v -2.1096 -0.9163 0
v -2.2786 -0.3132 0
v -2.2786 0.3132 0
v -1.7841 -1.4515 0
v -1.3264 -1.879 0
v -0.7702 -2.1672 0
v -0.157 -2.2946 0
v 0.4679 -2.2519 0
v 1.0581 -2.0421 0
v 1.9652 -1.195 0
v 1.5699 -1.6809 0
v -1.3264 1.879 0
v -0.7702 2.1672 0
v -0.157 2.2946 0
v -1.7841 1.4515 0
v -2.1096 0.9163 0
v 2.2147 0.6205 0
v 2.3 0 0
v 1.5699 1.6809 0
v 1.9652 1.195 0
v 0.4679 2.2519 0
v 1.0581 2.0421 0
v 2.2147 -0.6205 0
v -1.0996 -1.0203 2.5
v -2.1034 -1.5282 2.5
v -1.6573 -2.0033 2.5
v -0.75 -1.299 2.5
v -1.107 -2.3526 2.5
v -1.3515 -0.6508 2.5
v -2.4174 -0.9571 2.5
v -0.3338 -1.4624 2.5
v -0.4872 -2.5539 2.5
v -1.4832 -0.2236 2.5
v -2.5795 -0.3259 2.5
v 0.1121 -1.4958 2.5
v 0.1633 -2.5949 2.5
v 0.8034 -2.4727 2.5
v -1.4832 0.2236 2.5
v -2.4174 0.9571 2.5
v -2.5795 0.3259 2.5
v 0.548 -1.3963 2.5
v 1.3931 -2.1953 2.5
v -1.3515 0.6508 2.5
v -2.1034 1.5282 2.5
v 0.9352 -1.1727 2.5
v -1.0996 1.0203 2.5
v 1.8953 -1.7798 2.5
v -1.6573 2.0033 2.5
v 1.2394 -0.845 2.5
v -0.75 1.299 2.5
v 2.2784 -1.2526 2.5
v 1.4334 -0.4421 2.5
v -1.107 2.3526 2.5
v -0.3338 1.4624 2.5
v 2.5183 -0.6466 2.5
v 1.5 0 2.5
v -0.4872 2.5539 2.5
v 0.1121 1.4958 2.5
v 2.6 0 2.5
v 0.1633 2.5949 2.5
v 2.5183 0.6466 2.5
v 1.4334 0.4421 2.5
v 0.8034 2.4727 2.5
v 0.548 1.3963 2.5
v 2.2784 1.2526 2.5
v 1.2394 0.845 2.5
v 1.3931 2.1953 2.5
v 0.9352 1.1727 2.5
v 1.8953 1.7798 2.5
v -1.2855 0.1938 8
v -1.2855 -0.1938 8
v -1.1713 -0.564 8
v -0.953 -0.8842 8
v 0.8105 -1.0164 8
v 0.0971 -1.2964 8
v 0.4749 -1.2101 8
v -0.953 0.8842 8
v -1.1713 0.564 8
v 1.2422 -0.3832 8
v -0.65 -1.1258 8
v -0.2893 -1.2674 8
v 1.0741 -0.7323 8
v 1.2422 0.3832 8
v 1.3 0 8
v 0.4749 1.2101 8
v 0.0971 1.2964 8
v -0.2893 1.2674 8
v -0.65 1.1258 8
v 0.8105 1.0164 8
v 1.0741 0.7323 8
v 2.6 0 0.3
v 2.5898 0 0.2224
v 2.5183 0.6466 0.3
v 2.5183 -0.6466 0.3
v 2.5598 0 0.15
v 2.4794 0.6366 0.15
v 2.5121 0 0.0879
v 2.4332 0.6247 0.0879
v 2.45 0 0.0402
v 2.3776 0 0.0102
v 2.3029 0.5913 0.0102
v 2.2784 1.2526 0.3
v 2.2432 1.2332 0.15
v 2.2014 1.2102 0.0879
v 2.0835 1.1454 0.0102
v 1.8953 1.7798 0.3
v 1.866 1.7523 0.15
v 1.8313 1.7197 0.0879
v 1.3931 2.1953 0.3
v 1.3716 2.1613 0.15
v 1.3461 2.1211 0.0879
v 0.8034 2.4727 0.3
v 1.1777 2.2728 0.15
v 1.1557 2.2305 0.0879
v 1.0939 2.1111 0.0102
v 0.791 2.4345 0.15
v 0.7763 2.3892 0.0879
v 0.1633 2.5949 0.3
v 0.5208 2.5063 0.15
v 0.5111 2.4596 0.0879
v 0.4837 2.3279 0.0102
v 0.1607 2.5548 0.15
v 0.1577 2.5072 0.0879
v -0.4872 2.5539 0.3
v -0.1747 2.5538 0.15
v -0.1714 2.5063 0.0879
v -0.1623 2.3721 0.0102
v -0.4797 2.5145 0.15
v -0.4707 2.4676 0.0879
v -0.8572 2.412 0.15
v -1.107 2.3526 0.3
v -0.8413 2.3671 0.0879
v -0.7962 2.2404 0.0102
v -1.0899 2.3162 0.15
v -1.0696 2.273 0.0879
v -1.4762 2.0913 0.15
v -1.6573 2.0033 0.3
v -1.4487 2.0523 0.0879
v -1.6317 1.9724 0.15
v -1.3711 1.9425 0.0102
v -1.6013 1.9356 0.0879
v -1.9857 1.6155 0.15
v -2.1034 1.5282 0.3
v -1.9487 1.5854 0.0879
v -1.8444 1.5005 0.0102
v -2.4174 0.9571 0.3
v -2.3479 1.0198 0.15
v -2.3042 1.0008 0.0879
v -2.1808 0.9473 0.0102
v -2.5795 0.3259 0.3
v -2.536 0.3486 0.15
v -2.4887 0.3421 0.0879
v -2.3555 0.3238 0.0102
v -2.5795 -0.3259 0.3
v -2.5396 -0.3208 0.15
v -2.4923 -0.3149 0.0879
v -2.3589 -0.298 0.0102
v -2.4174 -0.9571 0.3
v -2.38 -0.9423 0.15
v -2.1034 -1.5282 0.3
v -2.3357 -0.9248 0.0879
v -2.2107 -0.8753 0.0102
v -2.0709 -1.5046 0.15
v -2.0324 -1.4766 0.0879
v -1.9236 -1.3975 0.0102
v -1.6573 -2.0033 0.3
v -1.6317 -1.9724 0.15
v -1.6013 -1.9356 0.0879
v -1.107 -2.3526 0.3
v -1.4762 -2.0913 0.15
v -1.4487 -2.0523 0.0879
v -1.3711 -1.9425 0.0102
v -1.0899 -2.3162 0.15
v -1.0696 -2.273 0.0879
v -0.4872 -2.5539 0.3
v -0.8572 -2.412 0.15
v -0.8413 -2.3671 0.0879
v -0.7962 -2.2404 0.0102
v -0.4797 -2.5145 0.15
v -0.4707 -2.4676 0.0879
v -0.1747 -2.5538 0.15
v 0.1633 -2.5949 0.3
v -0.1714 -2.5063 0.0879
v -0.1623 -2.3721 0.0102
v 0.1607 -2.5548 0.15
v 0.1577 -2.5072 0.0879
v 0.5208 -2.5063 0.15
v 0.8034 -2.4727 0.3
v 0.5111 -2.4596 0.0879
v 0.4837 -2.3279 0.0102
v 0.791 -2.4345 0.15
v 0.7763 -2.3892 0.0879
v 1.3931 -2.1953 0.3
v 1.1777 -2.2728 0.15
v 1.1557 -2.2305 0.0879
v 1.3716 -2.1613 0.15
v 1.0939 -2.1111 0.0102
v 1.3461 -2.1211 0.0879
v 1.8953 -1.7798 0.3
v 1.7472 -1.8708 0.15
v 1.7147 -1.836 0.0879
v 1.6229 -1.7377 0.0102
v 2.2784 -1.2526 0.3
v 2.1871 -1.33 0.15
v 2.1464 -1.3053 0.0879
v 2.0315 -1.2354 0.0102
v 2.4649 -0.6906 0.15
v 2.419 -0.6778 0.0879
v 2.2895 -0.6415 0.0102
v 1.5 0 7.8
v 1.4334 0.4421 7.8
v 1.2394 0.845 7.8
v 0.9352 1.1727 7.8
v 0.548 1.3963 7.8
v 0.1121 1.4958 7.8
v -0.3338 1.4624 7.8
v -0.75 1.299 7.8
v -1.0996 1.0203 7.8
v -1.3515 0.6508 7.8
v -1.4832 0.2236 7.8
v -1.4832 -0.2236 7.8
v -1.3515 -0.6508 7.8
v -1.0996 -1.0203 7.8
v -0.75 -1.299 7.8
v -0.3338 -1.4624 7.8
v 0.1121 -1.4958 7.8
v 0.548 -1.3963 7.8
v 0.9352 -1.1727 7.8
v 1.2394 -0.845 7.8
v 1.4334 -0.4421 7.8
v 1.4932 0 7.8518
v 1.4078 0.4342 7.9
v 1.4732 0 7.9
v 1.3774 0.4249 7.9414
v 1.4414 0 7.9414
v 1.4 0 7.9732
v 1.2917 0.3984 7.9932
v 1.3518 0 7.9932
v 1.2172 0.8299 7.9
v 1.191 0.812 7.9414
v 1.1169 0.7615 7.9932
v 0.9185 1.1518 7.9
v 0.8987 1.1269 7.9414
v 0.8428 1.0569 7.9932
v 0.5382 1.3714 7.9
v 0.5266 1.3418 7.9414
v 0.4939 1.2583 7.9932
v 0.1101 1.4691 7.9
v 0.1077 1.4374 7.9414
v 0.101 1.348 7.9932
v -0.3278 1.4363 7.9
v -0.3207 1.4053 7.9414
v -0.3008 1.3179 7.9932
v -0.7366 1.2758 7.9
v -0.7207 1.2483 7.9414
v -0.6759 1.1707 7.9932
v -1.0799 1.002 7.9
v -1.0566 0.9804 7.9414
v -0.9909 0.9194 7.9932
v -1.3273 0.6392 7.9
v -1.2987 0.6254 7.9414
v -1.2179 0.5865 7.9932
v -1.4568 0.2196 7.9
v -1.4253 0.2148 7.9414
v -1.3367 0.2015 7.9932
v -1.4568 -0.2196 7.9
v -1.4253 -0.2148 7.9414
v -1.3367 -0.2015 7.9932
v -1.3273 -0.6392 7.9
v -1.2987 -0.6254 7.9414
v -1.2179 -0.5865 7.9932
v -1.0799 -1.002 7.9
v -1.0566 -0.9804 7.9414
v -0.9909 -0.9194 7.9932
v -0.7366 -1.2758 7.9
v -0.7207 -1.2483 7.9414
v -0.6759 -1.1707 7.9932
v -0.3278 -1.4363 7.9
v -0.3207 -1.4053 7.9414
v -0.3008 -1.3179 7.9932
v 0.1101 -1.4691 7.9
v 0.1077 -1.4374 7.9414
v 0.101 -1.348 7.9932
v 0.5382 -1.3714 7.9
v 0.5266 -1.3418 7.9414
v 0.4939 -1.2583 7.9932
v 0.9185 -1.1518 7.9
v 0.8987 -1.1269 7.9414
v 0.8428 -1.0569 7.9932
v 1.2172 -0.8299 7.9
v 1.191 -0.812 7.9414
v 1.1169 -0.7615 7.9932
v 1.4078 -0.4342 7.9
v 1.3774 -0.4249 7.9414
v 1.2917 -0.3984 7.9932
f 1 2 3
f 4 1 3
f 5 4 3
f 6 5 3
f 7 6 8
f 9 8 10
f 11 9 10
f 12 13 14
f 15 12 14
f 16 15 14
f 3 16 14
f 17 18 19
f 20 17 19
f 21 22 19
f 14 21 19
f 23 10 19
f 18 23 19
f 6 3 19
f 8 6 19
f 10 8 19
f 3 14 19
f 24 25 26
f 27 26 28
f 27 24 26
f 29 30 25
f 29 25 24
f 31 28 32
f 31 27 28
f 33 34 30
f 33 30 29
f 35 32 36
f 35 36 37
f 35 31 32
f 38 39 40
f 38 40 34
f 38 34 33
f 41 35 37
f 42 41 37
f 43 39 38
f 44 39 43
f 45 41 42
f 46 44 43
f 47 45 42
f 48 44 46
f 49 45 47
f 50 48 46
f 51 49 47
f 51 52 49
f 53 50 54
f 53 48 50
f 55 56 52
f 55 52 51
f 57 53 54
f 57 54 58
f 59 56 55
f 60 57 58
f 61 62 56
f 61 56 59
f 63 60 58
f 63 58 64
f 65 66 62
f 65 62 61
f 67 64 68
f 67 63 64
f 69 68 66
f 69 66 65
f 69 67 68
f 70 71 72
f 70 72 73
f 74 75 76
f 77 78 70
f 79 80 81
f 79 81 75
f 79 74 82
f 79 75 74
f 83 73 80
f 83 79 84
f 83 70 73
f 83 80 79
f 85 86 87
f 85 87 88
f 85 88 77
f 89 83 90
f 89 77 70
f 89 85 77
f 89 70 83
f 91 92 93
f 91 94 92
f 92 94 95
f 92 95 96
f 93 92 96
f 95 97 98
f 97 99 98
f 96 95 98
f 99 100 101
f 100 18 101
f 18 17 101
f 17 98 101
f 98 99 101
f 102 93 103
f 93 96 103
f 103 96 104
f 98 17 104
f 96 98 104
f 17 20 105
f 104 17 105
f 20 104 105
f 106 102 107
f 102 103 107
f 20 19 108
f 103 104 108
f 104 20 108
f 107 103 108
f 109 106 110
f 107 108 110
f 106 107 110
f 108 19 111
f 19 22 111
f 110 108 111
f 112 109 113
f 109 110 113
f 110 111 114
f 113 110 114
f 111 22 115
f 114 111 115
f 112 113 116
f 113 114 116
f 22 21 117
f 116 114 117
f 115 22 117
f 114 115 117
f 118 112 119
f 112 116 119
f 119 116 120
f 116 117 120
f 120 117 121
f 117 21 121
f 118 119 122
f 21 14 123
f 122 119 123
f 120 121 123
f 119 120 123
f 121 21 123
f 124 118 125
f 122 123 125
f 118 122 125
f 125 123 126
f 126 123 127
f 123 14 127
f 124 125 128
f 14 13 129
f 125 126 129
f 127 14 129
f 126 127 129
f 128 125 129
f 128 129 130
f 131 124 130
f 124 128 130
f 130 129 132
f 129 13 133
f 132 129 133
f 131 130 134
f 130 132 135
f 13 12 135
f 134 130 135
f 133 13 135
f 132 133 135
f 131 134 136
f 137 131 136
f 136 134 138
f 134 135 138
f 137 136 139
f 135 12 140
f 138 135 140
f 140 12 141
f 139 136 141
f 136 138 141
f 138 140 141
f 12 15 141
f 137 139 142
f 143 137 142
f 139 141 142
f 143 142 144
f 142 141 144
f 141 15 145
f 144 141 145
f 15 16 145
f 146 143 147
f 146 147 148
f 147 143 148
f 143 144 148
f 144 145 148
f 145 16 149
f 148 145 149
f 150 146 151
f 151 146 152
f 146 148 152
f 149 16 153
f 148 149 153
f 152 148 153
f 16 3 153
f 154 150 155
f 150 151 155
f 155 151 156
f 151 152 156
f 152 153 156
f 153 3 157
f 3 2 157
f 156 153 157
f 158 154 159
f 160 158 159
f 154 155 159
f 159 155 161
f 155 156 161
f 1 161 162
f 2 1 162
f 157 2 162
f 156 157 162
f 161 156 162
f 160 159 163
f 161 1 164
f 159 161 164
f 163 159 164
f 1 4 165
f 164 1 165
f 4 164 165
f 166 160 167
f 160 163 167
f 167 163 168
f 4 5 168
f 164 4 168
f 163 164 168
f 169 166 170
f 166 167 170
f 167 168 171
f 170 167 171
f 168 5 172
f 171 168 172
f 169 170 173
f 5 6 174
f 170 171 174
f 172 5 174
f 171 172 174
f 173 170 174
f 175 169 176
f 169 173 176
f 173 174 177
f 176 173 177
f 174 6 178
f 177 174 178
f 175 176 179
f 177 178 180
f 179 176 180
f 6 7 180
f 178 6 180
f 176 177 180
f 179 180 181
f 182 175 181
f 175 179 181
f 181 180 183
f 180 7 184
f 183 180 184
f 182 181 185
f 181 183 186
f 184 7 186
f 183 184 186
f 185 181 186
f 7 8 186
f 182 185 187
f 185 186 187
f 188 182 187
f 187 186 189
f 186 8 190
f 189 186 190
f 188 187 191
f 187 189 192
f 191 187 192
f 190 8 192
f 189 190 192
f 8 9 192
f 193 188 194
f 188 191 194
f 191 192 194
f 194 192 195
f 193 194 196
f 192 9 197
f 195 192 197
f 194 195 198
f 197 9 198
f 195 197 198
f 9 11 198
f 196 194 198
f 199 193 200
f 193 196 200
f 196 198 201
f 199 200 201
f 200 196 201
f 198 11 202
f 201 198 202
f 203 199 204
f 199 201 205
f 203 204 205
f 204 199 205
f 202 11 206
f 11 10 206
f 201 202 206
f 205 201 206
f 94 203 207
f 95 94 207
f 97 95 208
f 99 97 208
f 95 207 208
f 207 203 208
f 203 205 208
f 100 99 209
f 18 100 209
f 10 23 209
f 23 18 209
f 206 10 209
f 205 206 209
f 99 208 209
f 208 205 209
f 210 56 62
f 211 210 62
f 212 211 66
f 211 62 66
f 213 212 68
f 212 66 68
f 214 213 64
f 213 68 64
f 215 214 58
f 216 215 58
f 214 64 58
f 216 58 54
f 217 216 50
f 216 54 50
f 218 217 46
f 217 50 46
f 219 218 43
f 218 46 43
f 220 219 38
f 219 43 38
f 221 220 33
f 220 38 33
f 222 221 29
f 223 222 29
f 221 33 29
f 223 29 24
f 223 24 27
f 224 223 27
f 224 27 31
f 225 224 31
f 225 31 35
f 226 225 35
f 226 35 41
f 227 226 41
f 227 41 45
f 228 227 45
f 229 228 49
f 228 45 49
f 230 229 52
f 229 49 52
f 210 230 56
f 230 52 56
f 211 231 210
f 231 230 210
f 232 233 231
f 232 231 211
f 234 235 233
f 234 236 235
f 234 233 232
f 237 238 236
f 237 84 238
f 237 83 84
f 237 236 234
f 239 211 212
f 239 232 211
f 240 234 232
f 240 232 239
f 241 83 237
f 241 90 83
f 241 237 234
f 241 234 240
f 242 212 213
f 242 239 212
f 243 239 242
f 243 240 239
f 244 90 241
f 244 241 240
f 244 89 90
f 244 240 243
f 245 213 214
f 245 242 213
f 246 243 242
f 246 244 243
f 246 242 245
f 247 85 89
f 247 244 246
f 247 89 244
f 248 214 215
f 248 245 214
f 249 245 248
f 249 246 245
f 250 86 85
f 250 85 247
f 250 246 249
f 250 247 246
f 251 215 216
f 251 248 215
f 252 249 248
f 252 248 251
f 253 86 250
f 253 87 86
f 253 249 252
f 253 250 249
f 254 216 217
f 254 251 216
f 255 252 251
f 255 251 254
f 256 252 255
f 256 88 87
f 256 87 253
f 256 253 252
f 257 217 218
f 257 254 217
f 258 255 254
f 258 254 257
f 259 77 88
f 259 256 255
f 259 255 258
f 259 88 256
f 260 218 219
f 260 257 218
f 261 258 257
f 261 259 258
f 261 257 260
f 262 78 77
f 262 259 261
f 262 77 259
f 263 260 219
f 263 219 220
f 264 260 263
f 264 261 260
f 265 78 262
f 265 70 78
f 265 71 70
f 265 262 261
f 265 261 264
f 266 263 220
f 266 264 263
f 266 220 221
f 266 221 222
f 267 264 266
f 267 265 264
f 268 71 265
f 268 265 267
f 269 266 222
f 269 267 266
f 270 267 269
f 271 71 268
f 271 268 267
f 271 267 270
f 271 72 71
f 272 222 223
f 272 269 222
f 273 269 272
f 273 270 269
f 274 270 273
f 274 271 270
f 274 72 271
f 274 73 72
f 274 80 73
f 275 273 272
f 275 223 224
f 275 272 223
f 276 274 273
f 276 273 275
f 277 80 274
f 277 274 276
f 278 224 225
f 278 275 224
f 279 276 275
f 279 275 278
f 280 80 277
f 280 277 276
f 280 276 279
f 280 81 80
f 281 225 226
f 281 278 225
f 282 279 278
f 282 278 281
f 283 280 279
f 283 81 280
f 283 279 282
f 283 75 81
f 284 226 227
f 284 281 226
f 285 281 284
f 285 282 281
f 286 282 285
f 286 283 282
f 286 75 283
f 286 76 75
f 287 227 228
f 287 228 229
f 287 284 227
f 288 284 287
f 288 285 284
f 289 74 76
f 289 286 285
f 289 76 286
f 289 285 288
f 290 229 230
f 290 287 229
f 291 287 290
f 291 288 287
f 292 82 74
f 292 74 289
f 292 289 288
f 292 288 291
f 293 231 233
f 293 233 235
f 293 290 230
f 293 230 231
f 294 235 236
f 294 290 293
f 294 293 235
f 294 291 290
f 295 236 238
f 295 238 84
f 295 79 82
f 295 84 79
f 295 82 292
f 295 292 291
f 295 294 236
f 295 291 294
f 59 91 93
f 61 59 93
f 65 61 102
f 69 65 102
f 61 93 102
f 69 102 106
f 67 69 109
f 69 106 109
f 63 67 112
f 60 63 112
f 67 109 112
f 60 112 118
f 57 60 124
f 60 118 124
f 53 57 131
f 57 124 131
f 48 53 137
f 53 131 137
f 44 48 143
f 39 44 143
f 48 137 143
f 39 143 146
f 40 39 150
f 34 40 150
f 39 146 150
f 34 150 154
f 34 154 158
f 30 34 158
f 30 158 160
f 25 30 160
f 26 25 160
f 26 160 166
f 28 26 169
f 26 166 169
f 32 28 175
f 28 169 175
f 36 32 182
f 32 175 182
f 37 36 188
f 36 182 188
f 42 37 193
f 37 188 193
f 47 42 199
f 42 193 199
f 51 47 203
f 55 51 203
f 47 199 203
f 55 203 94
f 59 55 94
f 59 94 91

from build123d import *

# Parameters (mm, degrees)
SKETCH1_R           = 2.6
BOSS_EXTRUDE1_DEPTH = 2.5
FILLET1_R           = 0.3
SKETCH2_R           = 1.5
BOSS_EXTRUDE2_DEPTH = 5.5
FILLET2_R           = 0.2


with BuildPart() as part:
    # Sketch1 → Boss-Extrude1 (new body)
    with BuildSketch(Plane.XY):
        Circle(SKETCH1_R)
    extrude(amount=BOSS_EXTRUDE1_DEPTH)

    # Fillet1
    fillet1_edges = [part.edges().sort_by_distance(p)[0] for p in [
        (-2.6, 0, 0),
    ]]
    fillet(fillet1_edges, radius=FILLET1_R)

    # Sketch2 → Boss-Extrude2 (add)
    with BuildSketch(Plane.XY.offset(2.5)):
        Circle(SKETCH2_R)
    extrude(amount=BOSS_EXTRUDE2_DEPTH)

    # Fillet2
    fillet2_edges = [part.edges().sort_by_distance(p)[0] for p in [
        (-1.5, 0, 8),
    ]]
    fillet(fillet2_edges, radius=FILLET2_R)


solid = part.part
